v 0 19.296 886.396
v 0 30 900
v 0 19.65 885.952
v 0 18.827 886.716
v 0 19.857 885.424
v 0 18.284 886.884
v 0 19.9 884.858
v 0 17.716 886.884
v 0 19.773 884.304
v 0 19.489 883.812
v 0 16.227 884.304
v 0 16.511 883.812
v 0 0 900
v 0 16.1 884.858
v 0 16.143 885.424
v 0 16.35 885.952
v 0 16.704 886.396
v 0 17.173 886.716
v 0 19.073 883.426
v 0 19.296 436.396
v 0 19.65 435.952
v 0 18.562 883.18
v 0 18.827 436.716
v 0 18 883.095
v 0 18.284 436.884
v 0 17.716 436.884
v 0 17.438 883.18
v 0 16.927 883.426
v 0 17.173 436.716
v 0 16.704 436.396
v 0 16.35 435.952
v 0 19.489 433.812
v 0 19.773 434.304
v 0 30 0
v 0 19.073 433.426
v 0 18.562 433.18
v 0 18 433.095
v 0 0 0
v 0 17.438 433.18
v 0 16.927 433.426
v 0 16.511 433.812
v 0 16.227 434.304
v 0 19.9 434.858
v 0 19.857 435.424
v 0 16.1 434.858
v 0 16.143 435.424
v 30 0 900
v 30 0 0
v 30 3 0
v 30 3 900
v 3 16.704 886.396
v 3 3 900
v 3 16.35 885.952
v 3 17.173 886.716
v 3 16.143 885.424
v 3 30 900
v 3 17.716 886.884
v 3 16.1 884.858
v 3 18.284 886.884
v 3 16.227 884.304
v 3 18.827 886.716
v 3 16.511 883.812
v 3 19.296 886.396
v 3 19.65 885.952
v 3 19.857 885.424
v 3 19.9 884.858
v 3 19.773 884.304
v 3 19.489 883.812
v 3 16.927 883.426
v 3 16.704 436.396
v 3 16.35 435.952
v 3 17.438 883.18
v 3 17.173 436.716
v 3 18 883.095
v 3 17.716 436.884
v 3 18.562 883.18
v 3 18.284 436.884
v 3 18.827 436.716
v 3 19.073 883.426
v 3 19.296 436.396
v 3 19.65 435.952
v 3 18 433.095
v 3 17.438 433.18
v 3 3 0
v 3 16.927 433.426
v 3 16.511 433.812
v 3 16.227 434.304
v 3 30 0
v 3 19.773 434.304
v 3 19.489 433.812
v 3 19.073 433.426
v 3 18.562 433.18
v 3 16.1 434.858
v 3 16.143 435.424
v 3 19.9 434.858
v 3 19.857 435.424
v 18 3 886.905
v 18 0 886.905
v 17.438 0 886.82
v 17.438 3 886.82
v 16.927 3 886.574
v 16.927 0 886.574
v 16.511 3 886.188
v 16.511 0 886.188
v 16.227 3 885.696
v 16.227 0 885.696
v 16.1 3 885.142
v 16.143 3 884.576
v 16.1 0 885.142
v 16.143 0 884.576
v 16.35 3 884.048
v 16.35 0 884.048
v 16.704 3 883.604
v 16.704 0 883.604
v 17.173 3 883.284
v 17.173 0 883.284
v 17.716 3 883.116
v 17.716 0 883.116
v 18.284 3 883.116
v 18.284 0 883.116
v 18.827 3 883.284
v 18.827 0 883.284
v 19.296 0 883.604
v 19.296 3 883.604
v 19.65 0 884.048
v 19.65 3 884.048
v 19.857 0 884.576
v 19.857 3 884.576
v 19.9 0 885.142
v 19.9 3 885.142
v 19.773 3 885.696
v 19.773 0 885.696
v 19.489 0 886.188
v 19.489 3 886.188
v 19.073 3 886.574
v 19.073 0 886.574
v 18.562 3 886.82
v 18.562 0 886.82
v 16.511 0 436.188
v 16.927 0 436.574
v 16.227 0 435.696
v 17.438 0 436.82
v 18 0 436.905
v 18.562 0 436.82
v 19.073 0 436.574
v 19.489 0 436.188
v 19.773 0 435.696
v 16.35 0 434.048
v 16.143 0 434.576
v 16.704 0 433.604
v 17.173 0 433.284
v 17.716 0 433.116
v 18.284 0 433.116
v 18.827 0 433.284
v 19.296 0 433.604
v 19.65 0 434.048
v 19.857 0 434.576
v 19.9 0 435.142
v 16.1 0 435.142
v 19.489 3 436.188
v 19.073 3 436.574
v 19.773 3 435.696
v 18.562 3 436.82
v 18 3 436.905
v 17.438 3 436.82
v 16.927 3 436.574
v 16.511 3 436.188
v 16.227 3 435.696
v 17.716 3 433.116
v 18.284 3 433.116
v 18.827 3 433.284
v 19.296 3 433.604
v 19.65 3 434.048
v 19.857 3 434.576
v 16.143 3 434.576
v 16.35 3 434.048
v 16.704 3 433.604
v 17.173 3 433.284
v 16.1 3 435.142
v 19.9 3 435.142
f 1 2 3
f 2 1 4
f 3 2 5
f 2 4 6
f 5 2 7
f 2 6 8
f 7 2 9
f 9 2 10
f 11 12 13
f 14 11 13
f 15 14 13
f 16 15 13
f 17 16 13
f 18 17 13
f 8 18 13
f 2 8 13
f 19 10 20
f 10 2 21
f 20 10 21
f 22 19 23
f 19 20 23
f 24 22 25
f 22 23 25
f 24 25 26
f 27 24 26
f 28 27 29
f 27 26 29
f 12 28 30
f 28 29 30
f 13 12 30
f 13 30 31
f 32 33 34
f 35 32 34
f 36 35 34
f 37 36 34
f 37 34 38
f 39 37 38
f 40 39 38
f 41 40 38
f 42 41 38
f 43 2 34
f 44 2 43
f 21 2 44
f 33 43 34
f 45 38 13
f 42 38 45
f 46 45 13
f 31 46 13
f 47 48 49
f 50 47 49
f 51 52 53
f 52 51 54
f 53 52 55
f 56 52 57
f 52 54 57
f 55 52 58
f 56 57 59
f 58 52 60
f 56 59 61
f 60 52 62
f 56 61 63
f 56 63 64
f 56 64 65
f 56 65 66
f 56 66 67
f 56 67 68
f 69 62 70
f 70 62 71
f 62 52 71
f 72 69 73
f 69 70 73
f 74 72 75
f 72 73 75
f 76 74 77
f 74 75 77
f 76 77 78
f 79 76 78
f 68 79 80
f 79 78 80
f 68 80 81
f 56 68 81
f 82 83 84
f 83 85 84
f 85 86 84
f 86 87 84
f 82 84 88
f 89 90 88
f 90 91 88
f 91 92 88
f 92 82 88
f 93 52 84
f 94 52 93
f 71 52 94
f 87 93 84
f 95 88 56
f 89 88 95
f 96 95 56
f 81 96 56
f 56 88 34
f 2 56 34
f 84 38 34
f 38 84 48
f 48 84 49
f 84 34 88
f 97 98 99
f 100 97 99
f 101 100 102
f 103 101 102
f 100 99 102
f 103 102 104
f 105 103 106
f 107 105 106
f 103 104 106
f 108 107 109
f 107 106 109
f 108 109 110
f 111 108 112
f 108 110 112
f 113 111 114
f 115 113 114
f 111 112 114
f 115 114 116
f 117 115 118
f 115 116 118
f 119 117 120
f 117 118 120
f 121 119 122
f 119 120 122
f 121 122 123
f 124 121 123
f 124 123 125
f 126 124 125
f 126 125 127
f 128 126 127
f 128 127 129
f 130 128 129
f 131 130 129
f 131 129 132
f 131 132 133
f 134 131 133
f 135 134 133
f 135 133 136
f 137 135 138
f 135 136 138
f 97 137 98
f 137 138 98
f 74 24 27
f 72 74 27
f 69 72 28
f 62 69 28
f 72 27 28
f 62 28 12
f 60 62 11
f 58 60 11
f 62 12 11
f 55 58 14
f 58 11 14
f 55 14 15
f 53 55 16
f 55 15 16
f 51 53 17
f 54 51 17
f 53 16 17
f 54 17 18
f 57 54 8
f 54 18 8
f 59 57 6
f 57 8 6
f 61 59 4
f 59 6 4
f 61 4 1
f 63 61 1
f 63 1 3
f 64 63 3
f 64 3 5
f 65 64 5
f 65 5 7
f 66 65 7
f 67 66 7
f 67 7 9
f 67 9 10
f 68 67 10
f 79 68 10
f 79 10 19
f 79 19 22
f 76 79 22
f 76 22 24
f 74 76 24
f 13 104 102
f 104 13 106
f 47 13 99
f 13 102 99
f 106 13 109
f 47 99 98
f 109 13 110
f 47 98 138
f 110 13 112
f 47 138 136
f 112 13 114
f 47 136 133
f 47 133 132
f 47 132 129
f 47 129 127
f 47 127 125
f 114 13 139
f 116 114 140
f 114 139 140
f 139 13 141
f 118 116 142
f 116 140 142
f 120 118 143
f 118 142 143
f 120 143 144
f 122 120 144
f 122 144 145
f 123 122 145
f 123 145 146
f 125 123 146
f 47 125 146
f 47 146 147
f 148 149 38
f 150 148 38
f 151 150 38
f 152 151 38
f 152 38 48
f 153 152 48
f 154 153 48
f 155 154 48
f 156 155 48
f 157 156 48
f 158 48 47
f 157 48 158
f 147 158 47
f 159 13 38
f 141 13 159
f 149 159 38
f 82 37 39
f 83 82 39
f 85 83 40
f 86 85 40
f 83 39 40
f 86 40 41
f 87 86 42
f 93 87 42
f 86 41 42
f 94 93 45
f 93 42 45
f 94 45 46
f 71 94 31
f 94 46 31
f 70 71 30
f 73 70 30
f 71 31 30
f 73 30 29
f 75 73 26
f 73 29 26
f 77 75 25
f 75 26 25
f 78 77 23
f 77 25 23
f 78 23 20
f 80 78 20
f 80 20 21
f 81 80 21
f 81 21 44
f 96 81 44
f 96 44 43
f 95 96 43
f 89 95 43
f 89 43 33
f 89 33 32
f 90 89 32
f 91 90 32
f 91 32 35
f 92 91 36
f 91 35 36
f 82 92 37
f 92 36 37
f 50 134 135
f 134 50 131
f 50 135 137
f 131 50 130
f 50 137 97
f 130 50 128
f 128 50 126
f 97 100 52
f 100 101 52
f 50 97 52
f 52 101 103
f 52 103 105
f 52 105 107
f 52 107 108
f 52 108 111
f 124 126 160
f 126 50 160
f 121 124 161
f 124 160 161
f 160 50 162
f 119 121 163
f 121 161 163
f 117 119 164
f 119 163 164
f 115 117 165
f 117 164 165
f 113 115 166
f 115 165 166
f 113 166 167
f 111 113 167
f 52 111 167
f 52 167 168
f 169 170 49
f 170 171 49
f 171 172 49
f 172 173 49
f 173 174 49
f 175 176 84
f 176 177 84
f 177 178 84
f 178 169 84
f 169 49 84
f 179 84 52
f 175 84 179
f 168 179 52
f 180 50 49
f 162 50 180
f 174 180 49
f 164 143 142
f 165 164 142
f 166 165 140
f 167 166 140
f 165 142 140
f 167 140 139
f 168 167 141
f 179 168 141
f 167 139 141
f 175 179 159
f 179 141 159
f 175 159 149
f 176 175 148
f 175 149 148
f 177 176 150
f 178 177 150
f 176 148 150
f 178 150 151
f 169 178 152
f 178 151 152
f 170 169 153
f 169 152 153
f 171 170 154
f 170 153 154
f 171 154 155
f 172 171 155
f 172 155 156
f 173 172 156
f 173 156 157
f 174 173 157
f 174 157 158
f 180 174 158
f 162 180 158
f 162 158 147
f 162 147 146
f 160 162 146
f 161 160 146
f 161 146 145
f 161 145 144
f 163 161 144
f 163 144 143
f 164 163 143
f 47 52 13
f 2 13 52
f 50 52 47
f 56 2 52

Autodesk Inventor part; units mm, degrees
ref_plane "YZ Plane" through (0, 0, 0) normal (1, 0, 0) x (0, 1, 0)
ref_plane "XZ Plane" through (0, 0, 0) normal (0, 1, 0) x (-1, 0, 0)
ref_plane "XY Plane" through (0, 0, 0) normal (0, 0, 1) x (1, 0, 0)
sketch "Sketch1" plane through (0, 0, 0) normal (0, 0, 1) x (1, 0, 0)
  line L0 (0, 0) -> (30, 0)
  line L1 (30, 0) -> (30, 3)
  line L2 (30, 3) -> (3, 3)
  line L3 (3, 3) -> (3, 30)
  line L4 (3, 30) -> (0, 30)
  line L5 (0, 30) -> (0, 0)
  dimension "d0" = 3
  dimension "d1" = 3
  dimension "d2" = 30
  dimension "d3" = 30
extrude "Extrusion1" add sketch "Sketch1" along normal blind 900
sketch "Sketch2" plane through (3, 3, 900) normal (0, 1, 0) x (1, 0, 0)
  line L0 (0, 900) -> (0, 0) projected
  line L1 (27, 0) -> (0, 0) projected
  point P0 (-3, 900)
  point P1 (15, 15)
  point P2 (15, 465)
  point P3 (15, 915)
  point P4 (15, 1365)
  dimension "d6" = 15
  dimension "d7" = 15
  dimension "d8" = 27
  dimension "d9" = 15
  dimension "d10" = 450
  dimension "d11" = 450
  dimension "d12" = 15
  dimension "d13" = 450
  dimension "d14" = 15
hole "Hole1" at (18, 3, 885) at (18, 3, 435) at (18, 3, -15) at (18, 3, -465) direction (0, -1, 0) diameter 3.81 end through all
sketch "Sketch3" plane through (3, 30, 900) normal (1, 0, 0) x (0, 0, -1)
  line L0 (0, -27) -> (0, 0) projected
  line L1 (900, -27) -> (0, -27) projected
  point P0 (900, -30)
  point P1 (15, -12)
  point P2 (465, -12)
  point P3 (915, -12)
  point P4 (1365, -12)
  dimension "d22" = 15
  dimension "d23" = 15
  dimension "d24" = 15
  dimension "d25" = 450
  dimension "d26" = 450
  dimension "d27" = 15
  dimension "d28" = 450
  dimension "d29" = 15
hole "Hole2" at (3, 18, 885) at (3, 18, 435) at (3, 18, -15) at (3, 18, -465) direction (-1, 0, 0) diameter 3.81 end through all
equation "\"d0\" = Thickness"
equation "\"d1\" = Thickness"
equation "\"d2\" = Width"
equation "\"d3\" = Width"
equation "\"d4\" = Height"
equation "\"d6\" = HoleDistance"
equation "\"d7\" = HoleDistance"
equation "\"d9\" = HoleDistance"
equation "\"d12\" = HoleDistance"
equation "\"d14\" = HoleDistance"
equation "\"d22\" = HoleDistance"
equation "\"d23\" = HoleDistance"
equation "\"d24\" = HoleDistance"
equation "\"d27\" = HoleDistance"
equation "\"d29\" = HoleDistance"
equation "\"Width\" = 30"
equation "\"Thickness\" = 3"
equation "\"Height\" = 900"
equation "\"HoleDistance\" = 15"
properties part number "corner90"
